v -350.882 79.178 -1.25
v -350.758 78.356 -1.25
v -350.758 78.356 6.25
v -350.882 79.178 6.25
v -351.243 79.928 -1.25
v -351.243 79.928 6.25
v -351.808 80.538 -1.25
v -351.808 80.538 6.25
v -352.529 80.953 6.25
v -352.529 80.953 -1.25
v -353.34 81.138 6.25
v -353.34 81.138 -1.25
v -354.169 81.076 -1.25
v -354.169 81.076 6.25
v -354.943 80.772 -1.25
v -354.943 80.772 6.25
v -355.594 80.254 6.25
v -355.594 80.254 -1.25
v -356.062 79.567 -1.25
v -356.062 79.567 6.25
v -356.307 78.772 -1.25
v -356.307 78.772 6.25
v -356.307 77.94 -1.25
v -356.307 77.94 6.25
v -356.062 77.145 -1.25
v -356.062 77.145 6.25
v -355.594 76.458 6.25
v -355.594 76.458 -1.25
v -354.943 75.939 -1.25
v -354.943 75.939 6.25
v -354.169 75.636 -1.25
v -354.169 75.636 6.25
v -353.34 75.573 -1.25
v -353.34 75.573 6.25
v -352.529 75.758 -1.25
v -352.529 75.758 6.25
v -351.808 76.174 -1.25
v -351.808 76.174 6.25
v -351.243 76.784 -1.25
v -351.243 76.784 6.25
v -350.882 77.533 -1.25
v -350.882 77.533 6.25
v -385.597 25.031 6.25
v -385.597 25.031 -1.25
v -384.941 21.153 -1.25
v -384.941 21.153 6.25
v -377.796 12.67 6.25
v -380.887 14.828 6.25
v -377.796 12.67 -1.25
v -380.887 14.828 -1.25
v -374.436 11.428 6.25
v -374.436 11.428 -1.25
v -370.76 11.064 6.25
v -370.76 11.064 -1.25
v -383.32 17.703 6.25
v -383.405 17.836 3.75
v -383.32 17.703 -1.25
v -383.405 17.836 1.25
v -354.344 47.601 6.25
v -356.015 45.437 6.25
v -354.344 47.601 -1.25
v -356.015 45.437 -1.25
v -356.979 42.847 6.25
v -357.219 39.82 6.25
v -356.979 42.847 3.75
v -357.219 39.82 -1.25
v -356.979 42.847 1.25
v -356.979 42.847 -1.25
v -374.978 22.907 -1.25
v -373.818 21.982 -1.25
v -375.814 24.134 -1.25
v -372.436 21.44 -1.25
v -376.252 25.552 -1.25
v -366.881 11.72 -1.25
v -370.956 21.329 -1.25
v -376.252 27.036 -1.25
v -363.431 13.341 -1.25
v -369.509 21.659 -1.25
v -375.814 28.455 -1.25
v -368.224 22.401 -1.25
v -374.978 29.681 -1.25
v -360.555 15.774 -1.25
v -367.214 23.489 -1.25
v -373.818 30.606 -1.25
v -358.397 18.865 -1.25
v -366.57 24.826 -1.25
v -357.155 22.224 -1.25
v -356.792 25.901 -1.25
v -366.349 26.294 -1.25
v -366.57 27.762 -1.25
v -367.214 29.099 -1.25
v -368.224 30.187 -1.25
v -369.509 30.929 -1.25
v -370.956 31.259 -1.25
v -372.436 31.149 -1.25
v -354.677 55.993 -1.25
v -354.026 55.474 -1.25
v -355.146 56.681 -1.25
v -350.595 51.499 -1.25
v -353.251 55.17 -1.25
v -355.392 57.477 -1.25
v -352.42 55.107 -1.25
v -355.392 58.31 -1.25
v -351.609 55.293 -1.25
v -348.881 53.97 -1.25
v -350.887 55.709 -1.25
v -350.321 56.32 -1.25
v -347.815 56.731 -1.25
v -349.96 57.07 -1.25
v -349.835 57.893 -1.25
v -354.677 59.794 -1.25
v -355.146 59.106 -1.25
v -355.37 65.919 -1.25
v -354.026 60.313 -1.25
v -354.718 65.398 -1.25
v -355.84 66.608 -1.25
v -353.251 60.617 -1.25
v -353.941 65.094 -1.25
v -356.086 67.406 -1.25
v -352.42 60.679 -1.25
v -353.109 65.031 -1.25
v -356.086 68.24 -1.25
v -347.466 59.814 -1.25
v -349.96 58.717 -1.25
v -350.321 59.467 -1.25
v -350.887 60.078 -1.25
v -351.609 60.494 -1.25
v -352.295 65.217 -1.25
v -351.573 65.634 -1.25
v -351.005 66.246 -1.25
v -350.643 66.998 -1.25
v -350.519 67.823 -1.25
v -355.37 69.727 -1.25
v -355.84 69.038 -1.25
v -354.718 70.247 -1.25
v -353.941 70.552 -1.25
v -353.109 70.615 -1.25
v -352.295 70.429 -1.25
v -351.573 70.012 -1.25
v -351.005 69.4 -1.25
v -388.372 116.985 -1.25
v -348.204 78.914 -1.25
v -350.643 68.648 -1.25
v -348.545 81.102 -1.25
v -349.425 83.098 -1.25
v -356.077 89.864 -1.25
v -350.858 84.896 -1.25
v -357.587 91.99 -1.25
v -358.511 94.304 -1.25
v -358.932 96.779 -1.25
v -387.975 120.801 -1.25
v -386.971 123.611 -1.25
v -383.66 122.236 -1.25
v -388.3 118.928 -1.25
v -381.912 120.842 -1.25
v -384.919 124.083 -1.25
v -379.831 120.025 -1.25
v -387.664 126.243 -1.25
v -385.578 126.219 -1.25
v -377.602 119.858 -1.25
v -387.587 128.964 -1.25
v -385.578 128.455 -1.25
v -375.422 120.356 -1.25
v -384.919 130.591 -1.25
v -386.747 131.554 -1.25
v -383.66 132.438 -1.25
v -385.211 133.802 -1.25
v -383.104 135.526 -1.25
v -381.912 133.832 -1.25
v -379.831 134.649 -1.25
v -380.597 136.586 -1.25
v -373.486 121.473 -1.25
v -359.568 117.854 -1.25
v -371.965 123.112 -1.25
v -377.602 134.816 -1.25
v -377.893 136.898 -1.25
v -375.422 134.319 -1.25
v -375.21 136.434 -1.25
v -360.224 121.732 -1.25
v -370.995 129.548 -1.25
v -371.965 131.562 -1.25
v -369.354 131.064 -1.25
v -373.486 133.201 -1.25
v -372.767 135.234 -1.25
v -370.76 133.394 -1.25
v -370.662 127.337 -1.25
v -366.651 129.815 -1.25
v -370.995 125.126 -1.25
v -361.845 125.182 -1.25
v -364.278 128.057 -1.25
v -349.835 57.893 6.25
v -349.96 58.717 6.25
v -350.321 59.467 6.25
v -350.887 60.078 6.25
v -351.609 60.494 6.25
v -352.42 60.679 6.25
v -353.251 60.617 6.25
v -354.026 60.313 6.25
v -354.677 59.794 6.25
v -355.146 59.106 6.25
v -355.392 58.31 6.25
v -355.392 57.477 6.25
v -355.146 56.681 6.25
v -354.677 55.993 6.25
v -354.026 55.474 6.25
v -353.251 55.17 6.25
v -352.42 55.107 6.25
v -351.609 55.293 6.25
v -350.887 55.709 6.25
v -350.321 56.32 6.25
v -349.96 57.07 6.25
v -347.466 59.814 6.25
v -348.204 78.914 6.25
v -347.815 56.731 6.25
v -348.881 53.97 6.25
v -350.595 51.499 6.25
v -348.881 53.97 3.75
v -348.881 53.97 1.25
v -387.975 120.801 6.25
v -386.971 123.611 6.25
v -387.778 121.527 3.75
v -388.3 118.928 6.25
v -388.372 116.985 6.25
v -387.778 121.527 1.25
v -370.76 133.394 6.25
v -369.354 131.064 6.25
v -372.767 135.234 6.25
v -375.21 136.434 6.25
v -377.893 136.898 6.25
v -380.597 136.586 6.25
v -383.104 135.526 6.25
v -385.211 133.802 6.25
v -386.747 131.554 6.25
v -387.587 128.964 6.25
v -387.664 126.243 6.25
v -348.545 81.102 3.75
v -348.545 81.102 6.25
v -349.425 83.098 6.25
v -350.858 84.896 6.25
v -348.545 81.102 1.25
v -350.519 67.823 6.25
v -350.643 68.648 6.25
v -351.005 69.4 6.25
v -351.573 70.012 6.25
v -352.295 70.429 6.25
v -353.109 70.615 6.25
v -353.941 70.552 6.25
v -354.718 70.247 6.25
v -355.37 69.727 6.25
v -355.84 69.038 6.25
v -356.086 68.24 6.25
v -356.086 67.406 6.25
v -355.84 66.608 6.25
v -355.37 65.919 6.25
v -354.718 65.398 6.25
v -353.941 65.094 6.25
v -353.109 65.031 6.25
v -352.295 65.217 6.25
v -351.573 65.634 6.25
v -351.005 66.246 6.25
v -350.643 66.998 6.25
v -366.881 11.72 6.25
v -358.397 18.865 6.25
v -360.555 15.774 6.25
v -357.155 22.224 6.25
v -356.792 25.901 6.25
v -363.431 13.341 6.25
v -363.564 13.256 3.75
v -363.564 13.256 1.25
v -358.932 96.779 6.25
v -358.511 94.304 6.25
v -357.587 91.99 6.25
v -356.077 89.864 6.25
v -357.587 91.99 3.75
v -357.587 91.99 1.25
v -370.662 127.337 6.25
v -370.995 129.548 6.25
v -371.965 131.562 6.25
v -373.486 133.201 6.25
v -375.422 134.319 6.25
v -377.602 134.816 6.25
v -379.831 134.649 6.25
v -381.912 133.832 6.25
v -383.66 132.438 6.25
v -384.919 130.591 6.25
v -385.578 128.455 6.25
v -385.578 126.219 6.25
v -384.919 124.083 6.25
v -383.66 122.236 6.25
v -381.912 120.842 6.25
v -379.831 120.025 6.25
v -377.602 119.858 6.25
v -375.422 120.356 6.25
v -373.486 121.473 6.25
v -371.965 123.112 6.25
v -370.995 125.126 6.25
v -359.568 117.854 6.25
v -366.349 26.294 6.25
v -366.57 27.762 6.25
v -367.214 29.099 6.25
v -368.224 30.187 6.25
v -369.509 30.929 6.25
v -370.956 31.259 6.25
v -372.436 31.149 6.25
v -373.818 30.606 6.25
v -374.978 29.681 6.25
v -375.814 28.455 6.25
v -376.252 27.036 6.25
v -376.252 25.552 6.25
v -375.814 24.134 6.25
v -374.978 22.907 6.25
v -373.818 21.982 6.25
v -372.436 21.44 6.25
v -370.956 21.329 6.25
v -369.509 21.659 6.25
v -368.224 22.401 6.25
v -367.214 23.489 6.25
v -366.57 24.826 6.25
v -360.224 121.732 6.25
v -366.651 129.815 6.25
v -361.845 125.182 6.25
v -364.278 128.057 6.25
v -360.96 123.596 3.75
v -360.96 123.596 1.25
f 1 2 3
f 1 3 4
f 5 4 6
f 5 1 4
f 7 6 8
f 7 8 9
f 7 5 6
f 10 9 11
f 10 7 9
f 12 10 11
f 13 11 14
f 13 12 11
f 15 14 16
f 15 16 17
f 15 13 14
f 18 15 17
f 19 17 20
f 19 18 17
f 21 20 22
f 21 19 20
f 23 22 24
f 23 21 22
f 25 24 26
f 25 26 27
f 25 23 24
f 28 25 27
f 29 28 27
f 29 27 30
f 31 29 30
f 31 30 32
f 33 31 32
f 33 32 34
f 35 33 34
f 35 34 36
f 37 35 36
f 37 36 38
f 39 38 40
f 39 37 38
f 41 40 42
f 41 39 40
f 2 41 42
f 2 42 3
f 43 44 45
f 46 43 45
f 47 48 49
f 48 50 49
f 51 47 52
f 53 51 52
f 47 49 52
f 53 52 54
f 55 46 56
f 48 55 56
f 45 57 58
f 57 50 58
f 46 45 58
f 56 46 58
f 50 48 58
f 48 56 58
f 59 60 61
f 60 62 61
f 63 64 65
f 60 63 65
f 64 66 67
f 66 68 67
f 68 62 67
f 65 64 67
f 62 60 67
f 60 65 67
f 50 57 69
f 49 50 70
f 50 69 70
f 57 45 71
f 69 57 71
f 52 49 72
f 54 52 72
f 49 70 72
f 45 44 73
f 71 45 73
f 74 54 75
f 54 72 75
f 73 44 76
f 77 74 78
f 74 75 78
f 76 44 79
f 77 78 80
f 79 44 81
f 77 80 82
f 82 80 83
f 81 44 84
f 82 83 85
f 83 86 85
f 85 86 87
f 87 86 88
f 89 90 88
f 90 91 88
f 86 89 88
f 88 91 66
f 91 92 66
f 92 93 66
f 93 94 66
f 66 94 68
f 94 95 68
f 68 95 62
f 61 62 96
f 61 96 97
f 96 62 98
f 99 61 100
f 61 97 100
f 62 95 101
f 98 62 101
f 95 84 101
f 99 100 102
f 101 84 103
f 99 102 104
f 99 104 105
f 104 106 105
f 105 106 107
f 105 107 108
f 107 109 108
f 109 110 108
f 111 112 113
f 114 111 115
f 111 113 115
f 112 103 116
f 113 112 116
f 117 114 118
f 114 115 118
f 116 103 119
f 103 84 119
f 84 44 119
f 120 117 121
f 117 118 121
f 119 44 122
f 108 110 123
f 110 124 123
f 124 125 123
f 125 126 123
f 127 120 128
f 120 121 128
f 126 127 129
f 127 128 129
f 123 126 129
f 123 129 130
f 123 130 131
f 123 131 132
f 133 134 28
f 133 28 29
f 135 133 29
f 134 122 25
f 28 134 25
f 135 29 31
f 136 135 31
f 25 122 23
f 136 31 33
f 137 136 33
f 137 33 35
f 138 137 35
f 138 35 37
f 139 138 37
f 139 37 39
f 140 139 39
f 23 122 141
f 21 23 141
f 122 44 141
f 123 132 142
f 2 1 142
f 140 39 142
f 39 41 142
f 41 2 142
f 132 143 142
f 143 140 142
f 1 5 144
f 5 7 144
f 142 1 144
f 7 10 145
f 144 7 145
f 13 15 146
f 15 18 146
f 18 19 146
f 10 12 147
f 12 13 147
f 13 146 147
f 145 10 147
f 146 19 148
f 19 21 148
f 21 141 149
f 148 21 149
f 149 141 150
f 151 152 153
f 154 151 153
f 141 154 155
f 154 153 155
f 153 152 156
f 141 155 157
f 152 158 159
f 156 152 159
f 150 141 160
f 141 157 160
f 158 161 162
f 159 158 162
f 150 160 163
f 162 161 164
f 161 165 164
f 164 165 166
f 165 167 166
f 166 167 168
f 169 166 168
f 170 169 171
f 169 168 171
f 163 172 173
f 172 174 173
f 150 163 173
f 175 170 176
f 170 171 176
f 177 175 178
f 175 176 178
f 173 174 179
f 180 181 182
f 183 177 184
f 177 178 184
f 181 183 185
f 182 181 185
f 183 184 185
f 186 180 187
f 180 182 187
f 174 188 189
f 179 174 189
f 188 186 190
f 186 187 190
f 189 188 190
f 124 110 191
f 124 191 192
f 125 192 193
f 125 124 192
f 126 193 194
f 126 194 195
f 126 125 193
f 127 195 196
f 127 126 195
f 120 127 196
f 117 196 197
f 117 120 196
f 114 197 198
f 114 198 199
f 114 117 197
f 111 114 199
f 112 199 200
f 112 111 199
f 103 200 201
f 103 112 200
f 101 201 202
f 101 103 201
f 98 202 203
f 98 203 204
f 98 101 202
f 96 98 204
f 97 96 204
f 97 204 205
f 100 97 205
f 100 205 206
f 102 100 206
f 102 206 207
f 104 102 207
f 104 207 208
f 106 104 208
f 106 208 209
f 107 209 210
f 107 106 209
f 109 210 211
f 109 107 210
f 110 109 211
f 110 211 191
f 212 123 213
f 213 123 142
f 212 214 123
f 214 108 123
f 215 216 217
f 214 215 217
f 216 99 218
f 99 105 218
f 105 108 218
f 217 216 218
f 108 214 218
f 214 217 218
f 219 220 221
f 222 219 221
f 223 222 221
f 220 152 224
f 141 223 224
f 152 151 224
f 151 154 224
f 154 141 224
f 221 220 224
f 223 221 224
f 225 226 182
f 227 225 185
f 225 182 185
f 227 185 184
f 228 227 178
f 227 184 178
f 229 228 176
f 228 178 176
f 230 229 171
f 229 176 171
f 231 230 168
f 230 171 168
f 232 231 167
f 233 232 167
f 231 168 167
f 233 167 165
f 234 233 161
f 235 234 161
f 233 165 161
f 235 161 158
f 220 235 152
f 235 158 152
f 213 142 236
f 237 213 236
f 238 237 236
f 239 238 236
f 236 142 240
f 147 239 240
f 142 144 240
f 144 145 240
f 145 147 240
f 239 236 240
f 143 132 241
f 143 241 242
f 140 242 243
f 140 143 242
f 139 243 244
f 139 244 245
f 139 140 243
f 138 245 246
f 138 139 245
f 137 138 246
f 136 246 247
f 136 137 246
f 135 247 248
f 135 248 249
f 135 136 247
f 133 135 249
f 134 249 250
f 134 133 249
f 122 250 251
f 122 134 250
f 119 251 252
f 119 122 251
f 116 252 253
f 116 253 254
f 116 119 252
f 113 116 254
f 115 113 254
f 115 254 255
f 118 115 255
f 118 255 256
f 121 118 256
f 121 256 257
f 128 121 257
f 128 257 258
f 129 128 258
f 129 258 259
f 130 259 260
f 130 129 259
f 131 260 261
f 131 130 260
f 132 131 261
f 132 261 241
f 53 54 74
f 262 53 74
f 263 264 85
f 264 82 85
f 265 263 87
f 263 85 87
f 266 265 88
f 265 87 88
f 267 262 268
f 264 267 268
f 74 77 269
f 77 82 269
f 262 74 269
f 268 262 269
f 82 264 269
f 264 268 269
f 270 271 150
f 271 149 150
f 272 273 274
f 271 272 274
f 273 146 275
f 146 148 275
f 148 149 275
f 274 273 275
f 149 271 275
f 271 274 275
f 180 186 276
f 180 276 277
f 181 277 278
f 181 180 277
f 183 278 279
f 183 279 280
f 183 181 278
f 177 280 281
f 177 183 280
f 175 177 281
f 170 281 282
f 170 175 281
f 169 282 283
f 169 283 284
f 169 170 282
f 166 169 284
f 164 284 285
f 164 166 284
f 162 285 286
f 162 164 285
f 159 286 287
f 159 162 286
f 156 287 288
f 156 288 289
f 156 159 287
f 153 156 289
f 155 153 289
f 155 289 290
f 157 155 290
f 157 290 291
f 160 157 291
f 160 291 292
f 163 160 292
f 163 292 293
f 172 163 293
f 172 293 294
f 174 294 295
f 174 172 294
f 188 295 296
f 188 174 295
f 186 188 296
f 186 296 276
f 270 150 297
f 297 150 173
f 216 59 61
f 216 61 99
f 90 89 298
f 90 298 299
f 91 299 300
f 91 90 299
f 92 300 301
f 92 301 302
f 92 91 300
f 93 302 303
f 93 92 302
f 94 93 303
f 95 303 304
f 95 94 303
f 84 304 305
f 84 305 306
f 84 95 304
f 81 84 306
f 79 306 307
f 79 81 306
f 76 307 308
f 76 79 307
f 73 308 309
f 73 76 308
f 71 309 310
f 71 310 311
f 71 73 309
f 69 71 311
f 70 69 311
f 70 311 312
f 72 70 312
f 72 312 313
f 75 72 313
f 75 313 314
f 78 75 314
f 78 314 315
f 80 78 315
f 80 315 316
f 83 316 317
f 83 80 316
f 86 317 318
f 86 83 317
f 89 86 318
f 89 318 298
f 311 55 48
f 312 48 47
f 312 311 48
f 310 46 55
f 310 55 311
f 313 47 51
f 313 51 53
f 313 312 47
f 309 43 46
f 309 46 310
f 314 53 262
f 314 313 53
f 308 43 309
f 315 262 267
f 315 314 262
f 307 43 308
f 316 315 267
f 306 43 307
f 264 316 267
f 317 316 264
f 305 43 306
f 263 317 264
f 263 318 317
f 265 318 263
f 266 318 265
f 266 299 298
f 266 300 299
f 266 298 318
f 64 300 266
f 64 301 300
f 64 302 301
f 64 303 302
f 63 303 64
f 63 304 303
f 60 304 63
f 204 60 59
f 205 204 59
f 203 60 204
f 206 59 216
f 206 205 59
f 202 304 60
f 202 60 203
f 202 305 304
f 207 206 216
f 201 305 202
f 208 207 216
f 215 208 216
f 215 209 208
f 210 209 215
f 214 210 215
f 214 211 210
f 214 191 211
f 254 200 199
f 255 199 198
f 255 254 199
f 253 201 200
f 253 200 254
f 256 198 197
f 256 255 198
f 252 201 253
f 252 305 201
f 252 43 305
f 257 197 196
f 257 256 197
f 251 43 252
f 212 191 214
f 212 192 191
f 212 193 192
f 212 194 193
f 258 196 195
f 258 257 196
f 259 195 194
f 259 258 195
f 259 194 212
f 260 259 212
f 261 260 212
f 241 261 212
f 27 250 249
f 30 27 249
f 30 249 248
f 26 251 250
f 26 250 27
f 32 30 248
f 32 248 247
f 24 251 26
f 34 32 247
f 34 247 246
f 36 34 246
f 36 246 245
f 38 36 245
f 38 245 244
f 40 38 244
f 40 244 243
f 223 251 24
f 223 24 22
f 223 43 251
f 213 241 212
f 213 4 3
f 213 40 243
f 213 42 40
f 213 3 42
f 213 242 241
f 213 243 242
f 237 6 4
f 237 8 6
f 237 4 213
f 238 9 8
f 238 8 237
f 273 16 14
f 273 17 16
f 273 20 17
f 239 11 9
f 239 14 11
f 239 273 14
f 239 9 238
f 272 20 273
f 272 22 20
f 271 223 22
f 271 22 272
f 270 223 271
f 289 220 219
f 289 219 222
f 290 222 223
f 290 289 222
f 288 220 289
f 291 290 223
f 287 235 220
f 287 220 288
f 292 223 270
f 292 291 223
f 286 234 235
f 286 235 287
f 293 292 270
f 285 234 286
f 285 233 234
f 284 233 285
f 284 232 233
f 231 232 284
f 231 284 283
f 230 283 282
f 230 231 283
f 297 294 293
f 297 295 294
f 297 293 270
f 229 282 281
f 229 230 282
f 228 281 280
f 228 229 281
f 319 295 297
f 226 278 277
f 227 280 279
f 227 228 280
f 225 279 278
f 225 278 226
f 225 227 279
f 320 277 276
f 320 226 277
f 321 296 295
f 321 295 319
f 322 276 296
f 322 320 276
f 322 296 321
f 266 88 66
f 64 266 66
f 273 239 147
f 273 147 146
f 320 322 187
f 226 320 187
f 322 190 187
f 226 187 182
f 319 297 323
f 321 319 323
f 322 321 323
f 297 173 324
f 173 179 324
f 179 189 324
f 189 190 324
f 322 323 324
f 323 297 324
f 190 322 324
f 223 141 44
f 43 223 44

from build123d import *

# Parameters (mm, degrees)
SKETCH1_R           = 3.319499332
SKETCH1_R_2         = 1.86024312
SKETCH1_R_3         = 1.866358203
SKETCH1_R_4         = 1.862576991
SKETCH1_R_5         = 5
BOSS_EXTRUDE1_DEPTH = 5
SCALE1_SCALE        = 1.5


with BuildPart() as part:
    # Sketch1 → Boss-Extrude1 (new body)
    with BuildSketch(Plane.XY):
        with BuildLine():
            Line((-382.519657002, 101.671493886), (-380.669449348, 40.369064063))
            add(Edge.make_bspline(
                [(-380.669449348, 40.369064063), (-380.510075486, 35.088175777), (-376.059011151, 30.897862719), (-370.778076319, 31.057283127)],
                knots=[0.052631579, 0.052631579, 0.052631579, 0.052631579, 0.105263158, 0.105263158, 0.105263158, 0.105263158], degree=3))
            add(Edge.make_bspline(
                [(-370.778076319, 31.057283127), (-365.497188033, 31.216656989), (-361.304408032, 35.667860962), (-361.466295384, 40.948656156)],
                knots=[0.157894737, 0.157894737, 0.157894737, 0.157894737, 0.210526316, 0.210526316, 0.210526316, 0.210526316], degree=3))
            Line((-361.466295384, 40.948656156), (-361.750785175, 50.228506464))
            add(Edge.make_bspline(
                [(-361.750785175, 50.228506464), (-361.835778361, 52.39364506), (-361.180362664, 54.112685792), (-359.833970045, 55.415371618)],
                knots=[0.263157895, 0.263157895, 0.263157895, 0.263157895, 0.315789474, 0.315789474, 0.315789474, 0.315789474], degree=3))
            Line((-359.833970045, 55.415371618), (-357.334397688, 58.013854448))
            add(Edge.make_bspline(
                [(-357.334397688, 58.013854448), (-355.991914942, 59.571473289), (-355.227534814, 61.38849357), (-355.248387468, 63.55777477)],
                knots=[0.368421053, 0.368421053, 0.368421053, 0.368421053, 0.421052632, 0.421052632, 0.421052632, 0.421052632], degree=3))
            Line((-355.248387468, 63.55777477), (-355.740612523, 76.291020209))
            add(Edge.make_bspline(
                [(-355.740612523, 76.291020209), (-355.792418338, 77.812752004), (-356.366704175, 79.147601188), (-357.509736863, 80.278904258)],
                knots=[0.473684211, 0.473684211, 0.473684211, 0.473684211, 0.526315789, 0.526315789, 0.526315789, 0.526315789], degree=3))
            Line((-357.509736863, 80.278904258), (-360.989523636, 83.590706139))
            add(Edge.make_bspline(
                [(-360.989523636, 83.590706139), (-362.20931085, 84.939519155), (-362.761440742, 86.502630437), (-362.89242148, 88.200958152)],
                knots=[0.578947368, 0.578947368, 0.578947368, 0.578947368, 0.631578947, 0.631578947, 0.631578947, 0.631578947], degree=3))
            Line((-362.89242148, 88.200958152), (-363.316503038, 102.251132525))
            add(Edge.make_bspline(
                [(-363.316503038, 102.251132525), (-363.440362222, 106.355428381), (-366.156979065, 109.800631398), (-369.840498136, 111.057283127)],
                knots=[0.684210526, 0.684210526, 0.684210526, 0.684210526, 0.736842105, 0.736842105, 0.736842105, 0.736842105], degree=3))
            ThreePointArc((-369.840498136, 111.057283127), (-378.197199554, 114.445234435), (-381.585150862, 106.088533018))
            add(Edge.make_bspline(
                [(-381.585150862, 106.088533018), (-382.226602728, 104.751635805), (-382.567273667, 103.24866209), (-382.519657002, 101.671493886)],
                knots=[0.894736842, 0.894736842, 0.894736842, 0.894736842, 1, 1, 1, 1], degree=3))
        make_face()
        with Locations((-371.156901577, 41.210904817)):
            Circle(SKETCH1_R, mode=Mode.SUBTRACT)
        with Locations((-359.303466466, 75.91878991)):
            Circle(SKETCH1_R_2, mode=Mode.SUBTRACT)
        with Locations((-359.150100692, 68.896756505)):
            Circle(SKETCH1_R_3, mode=Mode.SUBTRACT)
        with Locations((-358.690863752, 62.277116942)):
            Circle(SKETCH1_R_4, mode=Mode.SUBTRACT)
        with Locations((-375.712824499, 108.572908073)):
            Circle(SKETCH1_R_5, mode=Mode.SUBTRACT)
    extrude(amount=BOSS_EXTRUDE1_DEPTH)


with BuildPart() as part_1:
    # Scale1: scaled about (-370.814087285, 71.044531915, 2.5)
    add(part.part.scale(SCALE1_SCALE).moved(Location((185.407043643, -35.522265957, -1.25))))


solid = part_1.part
